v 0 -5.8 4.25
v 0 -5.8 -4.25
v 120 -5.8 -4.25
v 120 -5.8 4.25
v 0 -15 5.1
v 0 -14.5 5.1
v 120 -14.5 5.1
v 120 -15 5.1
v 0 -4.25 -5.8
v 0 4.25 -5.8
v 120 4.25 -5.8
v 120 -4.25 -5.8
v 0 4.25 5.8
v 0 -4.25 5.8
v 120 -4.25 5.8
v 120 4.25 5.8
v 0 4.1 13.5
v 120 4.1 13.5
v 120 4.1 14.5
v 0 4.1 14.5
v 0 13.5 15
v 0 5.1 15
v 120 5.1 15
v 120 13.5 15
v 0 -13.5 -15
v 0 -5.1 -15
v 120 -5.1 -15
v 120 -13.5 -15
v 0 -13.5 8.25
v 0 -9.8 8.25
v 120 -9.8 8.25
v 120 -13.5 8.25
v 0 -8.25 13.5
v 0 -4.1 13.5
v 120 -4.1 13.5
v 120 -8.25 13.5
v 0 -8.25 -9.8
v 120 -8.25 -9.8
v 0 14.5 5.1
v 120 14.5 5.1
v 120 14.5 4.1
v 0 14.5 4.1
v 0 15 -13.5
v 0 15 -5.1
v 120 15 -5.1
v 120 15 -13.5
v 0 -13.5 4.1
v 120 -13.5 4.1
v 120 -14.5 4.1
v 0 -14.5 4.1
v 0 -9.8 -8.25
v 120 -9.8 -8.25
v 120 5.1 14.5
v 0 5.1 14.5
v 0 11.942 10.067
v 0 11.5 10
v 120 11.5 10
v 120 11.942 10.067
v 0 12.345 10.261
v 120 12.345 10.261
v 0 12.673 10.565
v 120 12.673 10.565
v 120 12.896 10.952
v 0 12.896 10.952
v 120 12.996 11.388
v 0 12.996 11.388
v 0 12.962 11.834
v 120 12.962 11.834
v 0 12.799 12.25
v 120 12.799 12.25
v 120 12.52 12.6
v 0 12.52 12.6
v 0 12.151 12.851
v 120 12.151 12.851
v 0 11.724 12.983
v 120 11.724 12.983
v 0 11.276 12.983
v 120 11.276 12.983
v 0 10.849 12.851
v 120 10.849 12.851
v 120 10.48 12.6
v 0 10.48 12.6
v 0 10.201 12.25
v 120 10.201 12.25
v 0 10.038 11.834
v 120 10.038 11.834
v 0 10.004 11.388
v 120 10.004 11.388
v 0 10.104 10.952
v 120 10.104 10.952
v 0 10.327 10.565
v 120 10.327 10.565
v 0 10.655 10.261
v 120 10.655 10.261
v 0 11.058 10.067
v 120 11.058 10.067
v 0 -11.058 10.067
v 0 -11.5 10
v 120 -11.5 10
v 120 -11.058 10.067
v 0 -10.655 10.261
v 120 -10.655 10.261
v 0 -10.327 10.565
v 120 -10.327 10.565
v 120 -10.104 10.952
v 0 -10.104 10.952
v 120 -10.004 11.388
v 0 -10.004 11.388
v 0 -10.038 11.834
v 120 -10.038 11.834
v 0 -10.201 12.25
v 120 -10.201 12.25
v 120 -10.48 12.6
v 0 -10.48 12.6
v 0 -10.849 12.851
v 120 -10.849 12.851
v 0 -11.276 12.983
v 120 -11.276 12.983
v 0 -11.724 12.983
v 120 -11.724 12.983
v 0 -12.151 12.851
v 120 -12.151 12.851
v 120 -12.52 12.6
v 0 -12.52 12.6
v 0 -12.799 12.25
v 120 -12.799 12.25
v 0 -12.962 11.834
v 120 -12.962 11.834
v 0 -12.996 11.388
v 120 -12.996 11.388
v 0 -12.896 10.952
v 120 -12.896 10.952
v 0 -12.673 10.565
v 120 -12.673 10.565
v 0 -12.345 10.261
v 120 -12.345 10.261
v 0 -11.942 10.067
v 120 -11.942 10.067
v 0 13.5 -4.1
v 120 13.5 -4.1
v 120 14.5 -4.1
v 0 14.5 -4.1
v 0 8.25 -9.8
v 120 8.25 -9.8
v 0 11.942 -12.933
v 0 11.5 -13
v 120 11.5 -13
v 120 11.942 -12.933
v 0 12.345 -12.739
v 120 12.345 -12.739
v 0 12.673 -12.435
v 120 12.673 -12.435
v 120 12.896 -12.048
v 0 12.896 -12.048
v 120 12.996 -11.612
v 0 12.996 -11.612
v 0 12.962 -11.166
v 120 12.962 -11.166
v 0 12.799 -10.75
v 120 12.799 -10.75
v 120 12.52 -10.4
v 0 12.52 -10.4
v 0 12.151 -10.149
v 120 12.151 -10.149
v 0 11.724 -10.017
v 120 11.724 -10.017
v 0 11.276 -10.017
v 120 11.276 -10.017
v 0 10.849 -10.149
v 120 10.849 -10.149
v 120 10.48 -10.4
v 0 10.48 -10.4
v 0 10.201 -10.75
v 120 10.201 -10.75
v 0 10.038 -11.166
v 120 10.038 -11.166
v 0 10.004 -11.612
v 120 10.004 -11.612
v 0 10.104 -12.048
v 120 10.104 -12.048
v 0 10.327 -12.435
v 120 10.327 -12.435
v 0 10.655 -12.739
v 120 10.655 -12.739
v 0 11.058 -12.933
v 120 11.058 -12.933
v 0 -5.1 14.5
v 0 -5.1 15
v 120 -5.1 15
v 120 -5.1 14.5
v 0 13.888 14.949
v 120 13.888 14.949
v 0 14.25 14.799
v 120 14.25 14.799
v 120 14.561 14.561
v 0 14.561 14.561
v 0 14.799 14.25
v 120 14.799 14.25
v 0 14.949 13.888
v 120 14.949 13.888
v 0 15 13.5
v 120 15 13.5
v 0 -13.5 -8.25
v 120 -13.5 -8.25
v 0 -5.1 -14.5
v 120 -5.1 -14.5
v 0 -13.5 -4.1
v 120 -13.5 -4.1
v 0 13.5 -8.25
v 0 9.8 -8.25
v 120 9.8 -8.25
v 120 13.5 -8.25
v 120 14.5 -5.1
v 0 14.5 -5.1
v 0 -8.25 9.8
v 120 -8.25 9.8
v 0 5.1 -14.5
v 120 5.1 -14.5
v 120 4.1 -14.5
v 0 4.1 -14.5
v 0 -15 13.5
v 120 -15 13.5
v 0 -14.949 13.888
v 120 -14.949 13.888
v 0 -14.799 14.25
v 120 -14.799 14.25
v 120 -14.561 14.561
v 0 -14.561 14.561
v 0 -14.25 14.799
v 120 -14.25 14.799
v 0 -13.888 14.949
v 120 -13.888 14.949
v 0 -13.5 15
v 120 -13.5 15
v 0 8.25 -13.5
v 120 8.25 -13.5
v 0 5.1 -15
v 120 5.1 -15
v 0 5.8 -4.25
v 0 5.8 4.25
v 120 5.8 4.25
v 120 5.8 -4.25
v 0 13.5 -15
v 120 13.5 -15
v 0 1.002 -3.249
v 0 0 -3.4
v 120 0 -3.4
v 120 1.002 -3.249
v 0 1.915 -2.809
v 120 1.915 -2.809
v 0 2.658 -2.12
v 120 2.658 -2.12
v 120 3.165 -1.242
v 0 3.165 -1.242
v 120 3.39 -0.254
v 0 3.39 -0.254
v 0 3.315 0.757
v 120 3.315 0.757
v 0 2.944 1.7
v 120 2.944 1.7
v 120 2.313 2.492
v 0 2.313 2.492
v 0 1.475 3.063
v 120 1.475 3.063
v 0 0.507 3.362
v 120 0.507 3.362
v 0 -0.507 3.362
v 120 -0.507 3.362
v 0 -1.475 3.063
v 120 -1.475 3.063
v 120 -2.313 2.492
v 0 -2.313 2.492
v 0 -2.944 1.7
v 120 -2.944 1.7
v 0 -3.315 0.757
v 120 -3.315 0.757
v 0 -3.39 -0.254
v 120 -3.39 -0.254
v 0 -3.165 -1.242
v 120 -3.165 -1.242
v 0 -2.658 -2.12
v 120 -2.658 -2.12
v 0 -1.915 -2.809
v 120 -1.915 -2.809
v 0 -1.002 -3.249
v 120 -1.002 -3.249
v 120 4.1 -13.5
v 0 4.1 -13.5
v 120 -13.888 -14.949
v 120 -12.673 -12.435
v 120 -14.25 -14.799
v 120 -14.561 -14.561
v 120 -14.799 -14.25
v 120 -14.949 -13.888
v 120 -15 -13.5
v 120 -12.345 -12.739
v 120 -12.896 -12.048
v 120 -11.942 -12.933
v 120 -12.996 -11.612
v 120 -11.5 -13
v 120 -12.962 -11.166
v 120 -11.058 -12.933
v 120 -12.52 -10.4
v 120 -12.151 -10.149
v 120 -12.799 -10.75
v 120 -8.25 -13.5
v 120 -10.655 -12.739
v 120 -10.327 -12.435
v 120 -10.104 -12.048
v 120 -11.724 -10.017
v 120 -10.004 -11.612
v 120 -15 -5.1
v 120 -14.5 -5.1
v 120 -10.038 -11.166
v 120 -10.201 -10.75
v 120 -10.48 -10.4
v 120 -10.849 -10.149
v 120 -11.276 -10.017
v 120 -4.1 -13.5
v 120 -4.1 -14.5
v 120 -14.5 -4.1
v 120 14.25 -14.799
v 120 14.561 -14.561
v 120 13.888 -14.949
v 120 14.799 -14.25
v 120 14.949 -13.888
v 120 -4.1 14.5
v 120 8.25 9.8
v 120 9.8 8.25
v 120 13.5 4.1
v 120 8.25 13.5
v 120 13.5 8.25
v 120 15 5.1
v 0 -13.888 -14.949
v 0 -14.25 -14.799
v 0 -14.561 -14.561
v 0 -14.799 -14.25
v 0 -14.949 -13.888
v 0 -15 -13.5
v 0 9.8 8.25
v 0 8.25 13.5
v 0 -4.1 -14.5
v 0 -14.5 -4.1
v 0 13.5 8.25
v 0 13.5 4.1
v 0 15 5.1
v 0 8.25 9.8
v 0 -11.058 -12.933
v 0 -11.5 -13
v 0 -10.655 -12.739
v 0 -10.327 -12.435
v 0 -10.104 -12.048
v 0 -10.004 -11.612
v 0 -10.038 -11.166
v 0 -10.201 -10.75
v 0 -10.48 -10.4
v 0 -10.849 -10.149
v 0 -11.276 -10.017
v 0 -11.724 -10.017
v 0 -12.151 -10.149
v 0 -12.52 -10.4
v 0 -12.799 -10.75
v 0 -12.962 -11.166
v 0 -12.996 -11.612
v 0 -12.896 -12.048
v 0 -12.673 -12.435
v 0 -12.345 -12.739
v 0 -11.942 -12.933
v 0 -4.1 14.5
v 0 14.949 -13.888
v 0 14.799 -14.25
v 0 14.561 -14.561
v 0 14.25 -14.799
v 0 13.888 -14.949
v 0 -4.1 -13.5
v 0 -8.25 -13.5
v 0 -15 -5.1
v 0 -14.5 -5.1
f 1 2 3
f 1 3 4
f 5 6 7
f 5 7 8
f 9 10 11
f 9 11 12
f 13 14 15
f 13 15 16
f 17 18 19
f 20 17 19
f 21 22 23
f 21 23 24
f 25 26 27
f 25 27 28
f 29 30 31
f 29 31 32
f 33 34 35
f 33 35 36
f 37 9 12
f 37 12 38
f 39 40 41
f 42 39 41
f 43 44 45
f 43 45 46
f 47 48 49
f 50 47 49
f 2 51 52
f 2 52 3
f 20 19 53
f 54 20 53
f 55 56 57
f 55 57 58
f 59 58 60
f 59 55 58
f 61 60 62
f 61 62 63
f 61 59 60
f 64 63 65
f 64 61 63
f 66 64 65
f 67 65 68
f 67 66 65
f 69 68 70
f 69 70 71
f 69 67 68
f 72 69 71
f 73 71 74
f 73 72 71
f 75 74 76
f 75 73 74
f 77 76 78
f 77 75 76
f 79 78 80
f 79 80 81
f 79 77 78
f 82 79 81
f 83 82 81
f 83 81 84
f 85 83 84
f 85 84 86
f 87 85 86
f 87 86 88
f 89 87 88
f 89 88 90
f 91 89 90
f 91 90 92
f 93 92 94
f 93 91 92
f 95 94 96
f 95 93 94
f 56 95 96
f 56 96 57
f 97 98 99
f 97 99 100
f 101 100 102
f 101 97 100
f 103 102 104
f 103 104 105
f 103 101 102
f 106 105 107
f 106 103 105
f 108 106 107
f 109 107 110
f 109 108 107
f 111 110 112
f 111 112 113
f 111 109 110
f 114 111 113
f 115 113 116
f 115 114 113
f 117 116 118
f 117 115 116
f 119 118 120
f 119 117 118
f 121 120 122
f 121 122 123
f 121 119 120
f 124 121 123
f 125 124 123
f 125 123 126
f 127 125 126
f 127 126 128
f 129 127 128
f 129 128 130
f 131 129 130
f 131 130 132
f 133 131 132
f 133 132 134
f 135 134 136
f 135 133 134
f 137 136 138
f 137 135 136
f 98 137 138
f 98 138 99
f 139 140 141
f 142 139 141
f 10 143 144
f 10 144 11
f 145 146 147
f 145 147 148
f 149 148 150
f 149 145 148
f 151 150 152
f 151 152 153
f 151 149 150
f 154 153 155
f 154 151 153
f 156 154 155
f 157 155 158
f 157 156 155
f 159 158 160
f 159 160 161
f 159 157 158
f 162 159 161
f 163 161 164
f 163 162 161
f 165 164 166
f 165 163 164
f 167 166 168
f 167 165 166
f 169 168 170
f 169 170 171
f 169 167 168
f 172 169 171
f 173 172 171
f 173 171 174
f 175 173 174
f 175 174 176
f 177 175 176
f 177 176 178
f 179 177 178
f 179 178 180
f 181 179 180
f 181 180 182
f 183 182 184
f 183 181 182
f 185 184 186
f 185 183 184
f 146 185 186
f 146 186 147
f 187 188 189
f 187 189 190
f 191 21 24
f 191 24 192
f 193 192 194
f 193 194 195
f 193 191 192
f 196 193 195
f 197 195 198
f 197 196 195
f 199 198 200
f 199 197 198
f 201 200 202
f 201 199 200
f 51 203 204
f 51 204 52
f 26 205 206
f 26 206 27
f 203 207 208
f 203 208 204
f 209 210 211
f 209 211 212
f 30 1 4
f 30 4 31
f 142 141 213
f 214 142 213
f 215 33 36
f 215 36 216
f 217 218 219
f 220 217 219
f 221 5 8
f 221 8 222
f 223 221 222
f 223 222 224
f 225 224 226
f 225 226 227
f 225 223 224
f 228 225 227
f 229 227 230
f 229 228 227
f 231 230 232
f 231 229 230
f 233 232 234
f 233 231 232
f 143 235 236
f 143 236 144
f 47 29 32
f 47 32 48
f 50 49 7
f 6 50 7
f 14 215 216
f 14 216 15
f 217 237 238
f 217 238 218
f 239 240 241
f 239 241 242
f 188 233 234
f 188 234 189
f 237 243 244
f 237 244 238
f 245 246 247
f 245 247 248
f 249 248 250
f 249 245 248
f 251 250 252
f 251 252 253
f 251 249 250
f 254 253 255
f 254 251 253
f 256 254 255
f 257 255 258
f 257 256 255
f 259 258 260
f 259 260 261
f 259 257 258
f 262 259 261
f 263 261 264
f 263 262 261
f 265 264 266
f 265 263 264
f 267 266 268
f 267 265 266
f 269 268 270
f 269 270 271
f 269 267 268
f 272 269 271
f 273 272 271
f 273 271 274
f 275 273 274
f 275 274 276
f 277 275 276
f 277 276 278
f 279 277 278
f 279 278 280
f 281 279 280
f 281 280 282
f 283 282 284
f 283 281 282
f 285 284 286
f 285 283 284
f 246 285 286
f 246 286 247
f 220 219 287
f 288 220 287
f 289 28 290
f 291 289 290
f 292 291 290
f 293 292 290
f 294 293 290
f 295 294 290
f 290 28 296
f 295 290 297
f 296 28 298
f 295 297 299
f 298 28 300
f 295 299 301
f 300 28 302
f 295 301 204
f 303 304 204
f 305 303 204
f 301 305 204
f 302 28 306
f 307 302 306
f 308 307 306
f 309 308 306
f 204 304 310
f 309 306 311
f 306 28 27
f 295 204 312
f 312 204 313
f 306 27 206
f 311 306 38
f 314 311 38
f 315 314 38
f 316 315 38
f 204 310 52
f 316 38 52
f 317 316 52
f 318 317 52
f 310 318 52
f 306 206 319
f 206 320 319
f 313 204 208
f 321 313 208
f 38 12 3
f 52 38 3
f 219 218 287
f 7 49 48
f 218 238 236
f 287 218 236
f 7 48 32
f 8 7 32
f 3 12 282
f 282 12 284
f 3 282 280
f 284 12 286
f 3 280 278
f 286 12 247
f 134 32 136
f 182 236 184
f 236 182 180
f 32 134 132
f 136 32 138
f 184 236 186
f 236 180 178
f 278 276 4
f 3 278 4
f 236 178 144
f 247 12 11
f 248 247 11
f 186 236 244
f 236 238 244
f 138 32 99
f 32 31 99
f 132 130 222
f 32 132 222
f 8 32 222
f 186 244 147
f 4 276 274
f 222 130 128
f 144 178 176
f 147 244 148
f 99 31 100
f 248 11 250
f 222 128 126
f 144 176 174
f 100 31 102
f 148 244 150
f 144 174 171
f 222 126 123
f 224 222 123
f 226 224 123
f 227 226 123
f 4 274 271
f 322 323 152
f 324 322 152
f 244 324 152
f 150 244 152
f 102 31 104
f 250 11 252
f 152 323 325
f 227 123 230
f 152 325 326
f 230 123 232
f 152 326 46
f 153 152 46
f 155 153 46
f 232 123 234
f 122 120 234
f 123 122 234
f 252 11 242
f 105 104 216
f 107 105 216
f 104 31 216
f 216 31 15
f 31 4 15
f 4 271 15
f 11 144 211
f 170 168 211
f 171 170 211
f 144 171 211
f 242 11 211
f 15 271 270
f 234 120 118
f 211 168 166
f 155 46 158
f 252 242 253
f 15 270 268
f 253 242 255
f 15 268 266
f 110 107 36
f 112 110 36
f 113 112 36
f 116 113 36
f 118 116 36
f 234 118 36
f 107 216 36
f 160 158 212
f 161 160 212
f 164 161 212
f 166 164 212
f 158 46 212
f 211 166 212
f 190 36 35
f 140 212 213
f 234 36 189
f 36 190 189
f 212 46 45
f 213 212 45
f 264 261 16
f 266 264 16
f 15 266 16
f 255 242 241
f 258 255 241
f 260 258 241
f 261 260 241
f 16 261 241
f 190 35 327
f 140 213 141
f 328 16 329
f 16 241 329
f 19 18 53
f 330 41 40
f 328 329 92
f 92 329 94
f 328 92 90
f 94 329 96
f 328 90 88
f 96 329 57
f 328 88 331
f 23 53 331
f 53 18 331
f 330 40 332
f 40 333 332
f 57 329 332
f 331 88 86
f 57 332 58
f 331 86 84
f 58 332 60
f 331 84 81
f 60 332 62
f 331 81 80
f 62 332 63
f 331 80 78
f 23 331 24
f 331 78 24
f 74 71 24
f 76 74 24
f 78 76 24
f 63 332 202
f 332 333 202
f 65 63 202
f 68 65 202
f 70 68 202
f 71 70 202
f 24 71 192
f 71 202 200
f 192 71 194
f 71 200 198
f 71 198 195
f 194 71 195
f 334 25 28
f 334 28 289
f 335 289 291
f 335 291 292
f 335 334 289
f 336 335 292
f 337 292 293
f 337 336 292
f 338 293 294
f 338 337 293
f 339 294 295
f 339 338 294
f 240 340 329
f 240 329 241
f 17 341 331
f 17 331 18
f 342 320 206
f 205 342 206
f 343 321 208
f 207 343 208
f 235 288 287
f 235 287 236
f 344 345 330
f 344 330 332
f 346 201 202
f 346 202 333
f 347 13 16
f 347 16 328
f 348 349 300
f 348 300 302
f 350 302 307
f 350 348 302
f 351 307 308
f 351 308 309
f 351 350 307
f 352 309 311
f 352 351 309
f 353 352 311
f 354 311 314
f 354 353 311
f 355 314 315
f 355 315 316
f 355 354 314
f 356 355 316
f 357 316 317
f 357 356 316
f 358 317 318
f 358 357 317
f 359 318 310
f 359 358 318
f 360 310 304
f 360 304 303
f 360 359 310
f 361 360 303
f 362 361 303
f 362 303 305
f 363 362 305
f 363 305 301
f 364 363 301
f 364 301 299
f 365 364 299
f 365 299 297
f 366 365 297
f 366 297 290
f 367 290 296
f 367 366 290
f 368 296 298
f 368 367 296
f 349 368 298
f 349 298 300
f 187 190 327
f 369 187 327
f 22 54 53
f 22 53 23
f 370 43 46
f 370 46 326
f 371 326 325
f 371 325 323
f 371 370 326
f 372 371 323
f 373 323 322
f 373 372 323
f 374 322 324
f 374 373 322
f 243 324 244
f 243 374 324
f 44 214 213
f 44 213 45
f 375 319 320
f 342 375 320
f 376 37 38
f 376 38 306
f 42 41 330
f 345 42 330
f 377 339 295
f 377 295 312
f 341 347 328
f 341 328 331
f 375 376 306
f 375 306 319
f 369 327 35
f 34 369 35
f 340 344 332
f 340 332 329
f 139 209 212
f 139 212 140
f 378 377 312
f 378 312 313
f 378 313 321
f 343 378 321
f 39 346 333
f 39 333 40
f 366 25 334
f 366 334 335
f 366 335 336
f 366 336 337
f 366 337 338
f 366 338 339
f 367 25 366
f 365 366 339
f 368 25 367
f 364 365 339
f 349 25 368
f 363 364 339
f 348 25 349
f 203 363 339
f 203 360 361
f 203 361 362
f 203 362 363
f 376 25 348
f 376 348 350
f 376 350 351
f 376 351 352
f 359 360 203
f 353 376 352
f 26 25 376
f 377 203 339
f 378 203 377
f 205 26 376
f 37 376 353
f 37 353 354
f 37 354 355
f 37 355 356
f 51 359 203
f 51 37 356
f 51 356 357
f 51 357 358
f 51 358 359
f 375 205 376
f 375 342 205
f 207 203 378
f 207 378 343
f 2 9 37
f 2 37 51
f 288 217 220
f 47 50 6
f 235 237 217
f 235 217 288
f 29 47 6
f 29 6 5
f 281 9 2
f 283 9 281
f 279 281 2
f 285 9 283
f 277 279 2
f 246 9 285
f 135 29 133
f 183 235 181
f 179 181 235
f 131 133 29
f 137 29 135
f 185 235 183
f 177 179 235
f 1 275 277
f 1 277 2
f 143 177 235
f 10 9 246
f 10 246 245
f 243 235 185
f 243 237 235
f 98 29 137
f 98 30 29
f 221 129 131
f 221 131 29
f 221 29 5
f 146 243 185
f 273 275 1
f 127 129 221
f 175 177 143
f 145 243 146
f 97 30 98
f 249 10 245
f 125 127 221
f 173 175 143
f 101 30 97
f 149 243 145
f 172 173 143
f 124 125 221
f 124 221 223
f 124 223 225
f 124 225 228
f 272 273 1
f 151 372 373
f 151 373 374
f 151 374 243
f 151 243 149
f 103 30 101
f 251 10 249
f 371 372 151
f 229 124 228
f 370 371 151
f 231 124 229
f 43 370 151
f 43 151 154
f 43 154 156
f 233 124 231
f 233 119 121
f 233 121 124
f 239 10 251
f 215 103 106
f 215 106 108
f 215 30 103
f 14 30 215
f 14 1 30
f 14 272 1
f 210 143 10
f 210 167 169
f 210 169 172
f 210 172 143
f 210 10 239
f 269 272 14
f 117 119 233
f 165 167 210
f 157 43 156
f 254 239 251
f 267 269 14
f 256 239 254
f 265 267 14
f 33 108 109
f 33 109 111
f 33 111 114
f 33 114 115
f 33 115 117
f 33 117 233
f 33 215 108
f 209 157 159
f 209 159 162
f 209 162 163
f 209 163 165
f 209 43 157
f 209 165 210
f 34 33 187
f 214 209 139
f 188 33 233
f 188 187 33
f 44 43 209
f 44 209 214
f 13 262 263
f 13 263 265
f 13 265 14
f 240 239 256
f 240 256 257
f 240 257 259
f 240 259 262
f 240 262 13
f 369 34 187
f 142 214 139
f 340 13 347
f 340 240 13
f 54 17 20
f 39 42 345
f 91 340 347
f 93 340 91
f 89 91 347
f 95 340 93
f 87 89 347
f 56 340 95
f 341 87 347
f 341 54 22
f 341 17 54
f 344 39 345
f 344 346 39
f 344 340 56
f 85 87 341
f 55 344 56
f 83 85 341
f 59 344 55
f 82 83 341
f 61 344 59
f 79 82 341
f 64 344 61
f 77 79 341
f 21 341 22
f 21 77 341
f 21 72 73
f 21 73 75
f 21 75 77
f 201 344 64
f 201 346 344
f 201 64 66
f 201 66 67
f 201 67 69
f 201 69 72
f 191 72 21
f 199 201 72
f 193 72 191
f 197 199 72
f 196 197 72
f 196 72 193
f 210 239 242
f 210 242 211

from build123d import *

# Parameters (mm, degrees)
SKETCH12_R               = 3.4
SKETCH12_R_2             = 1.5
F_30X_30G_X_R1_5_1_DEPTH = 120


with BuildPart() as part:
    # Sketch12 → 铝型材 30X 30G X R1.5(1) (new body)
    with BuildSketch(Plane(origin=(0, 0, 0), x_dir=(0, 0, -1), z_dir=(1, 0, 0))):
        with BuildLine():
            Line((-5.1, 15), (-5.1, 14.5))
            Line((-5.1, 14.5), (-4.1, 14.5))
            Line((-4.1, 14.5), (-4.1, 13.5))
            Line((-4.1, 13.5), (-8.25, 13.5))
            Line((-8.25, 13.5), (-8.25, 9.8))
            Line((-8.25, 9.8), (-4.25, 5.8))
            Line((-4.25, 5.8), (4.25, 5.8))
            Line((4.25, 5.8), (8.25, 9.8))
            Line((8.25, 9.8), (8.25, 13.5))
            Line((8.25, 13.5), (4.1, 13.5))
            Line((4.1, 13.5), (4.1, 14.5))
            Line((4.1, 14.5), (5.1, 14.5))
            Line((5.1, 14.5), (5.1, 15))
            Line((5.1, 15), (13.5, 15))
            ThreePointArc((13.5, 15), (14.560660172, 14.560660172), (15, 13.5))
            Line((15, 13.5), (15, 5.1))
            Line((15, 5.1), (14.5, 5.1))
            Line((14.5, 5.1), (14.5, 4.1))
            Line((14.5, 4.1), (13.5, 4.1))
            Line((13.5, 4.1), (13.5, 8.25))
            Line((13.5, 8.25), (9.8, 8.25))
            Line((9.8, 8.25), (5.8, 4.25))
            Line((5.8, 4.25), (5.8, -4.25))
            Line((5.8, -4.25), (9.8, -8.25))
            Line((9.8, -8.25), (13.5, -8.25))
            Line((13.5, -8.25), (13.5, -4.1))
            Line((13.5, -4.1), (14.5, -4.1))
            Line((14.5, -4.1), (14.5, -5.1))
            Line((14.5, -5.1), (15, -5.1))
            Line((15, -5.1), (15, -13.5))
            ThreePointArc((15, -13.5), (14.560660172, -14.560660172), (13.5, -15))
            Line((13.5, -15), (5.1, -15))
            Line((5.1, -15), (5.1, -14.5))
            Line((5.1, -14.5), (4.1, -14.5))
            Line((4.1, -14.5), (4.1, -13.5))
            Line((4.1, -13.5), (8.25, -13.5))
            Line((8.25, -13.5), (8.25, -9.8))
            Line((8.25, -9.8), (4.25, -5.8))
            Line((4.25, -5.8), (-4.25, -5.8))
            Line((-4.25, -5.8), (-8.25, -9.8))
            Line((-8.25, -9.8), (-8.25, -13.5))
            Line((-8.25, -13.5), (-4.1, -13.5))
            Line((-4.1, -13.5), (-4.1, -14.5))
            Line((-4.1, -14.5), (-5.1, -14.5))
            Line((-5.1, -14.5), (-5.1, -15))
            Line((-5.1, -15), (-13.5, -15))
            ThreePointArc((-13.5, -15), (-14.560660172, -14.560660172), (-15, -13.5))
            Line((-15, -13.5), (-15, -5.1))
            Line((-15, -5.1), (-14.5, -5.1))
            Line((-14.5, -5.1), (-14.5, -4.1))
            Line((-14.5, -4.1), (-13.5, -4.1))
            Line((-13.5, -4.1), (-13.5, -8.25))
            Line((-13.5, -8.25), (-9.8, -8.25))
            Line((-9.8, -8.25), (-5.8, -4.25))
            Line((-5.8, -4.25), (-5.8, 4.25))
            Line((-5.8, 4.25), (-9.8, 8.25))
            Line((-9.8, 8.25), (-13.5, 8.25))
            Line((-13.5, 8.25), (-13.5, 4.1))
            Line((-13.5, 4.1), (-14.5, 4.1))
            Line((-14.5, 4.1), (-14.5, 5.1))
            Line((-14.5, 5.1), (-15, 5.1))
            Line((-15, 5.1), (-15, 13.5))
            ThreePointArc((-15, 13.5), (-14.560660172, 14.560660172), (-13.5, 15))
            Line((-13.5, 15), (-5.1, 15))
        make_face()
        Circle(SKETCH12_R, mode=Mode.SUBTRACT)
        with Locations((-11.5, 11.5)):
            Circle(SKETCH12_R_2, mode=Mode.SUBTRACT)
        with Locations((11.5, 11.5)):
            Circle(SKETCH12_R_2, mode=Mode.SUBTRACT)
        with Locations((-11.5, -11.5)):
            Circle(SKETCH12_R_2, mode=Mode.SUBTRACT)
        with Locations((11.5, -11.5)):
            Circle(SKETCH12_R_2, mode=Mode.SUBTRACT)
    extrude(amount=F_30X_30G_X_R1_5_1_DEPTH)


solid = part.part
